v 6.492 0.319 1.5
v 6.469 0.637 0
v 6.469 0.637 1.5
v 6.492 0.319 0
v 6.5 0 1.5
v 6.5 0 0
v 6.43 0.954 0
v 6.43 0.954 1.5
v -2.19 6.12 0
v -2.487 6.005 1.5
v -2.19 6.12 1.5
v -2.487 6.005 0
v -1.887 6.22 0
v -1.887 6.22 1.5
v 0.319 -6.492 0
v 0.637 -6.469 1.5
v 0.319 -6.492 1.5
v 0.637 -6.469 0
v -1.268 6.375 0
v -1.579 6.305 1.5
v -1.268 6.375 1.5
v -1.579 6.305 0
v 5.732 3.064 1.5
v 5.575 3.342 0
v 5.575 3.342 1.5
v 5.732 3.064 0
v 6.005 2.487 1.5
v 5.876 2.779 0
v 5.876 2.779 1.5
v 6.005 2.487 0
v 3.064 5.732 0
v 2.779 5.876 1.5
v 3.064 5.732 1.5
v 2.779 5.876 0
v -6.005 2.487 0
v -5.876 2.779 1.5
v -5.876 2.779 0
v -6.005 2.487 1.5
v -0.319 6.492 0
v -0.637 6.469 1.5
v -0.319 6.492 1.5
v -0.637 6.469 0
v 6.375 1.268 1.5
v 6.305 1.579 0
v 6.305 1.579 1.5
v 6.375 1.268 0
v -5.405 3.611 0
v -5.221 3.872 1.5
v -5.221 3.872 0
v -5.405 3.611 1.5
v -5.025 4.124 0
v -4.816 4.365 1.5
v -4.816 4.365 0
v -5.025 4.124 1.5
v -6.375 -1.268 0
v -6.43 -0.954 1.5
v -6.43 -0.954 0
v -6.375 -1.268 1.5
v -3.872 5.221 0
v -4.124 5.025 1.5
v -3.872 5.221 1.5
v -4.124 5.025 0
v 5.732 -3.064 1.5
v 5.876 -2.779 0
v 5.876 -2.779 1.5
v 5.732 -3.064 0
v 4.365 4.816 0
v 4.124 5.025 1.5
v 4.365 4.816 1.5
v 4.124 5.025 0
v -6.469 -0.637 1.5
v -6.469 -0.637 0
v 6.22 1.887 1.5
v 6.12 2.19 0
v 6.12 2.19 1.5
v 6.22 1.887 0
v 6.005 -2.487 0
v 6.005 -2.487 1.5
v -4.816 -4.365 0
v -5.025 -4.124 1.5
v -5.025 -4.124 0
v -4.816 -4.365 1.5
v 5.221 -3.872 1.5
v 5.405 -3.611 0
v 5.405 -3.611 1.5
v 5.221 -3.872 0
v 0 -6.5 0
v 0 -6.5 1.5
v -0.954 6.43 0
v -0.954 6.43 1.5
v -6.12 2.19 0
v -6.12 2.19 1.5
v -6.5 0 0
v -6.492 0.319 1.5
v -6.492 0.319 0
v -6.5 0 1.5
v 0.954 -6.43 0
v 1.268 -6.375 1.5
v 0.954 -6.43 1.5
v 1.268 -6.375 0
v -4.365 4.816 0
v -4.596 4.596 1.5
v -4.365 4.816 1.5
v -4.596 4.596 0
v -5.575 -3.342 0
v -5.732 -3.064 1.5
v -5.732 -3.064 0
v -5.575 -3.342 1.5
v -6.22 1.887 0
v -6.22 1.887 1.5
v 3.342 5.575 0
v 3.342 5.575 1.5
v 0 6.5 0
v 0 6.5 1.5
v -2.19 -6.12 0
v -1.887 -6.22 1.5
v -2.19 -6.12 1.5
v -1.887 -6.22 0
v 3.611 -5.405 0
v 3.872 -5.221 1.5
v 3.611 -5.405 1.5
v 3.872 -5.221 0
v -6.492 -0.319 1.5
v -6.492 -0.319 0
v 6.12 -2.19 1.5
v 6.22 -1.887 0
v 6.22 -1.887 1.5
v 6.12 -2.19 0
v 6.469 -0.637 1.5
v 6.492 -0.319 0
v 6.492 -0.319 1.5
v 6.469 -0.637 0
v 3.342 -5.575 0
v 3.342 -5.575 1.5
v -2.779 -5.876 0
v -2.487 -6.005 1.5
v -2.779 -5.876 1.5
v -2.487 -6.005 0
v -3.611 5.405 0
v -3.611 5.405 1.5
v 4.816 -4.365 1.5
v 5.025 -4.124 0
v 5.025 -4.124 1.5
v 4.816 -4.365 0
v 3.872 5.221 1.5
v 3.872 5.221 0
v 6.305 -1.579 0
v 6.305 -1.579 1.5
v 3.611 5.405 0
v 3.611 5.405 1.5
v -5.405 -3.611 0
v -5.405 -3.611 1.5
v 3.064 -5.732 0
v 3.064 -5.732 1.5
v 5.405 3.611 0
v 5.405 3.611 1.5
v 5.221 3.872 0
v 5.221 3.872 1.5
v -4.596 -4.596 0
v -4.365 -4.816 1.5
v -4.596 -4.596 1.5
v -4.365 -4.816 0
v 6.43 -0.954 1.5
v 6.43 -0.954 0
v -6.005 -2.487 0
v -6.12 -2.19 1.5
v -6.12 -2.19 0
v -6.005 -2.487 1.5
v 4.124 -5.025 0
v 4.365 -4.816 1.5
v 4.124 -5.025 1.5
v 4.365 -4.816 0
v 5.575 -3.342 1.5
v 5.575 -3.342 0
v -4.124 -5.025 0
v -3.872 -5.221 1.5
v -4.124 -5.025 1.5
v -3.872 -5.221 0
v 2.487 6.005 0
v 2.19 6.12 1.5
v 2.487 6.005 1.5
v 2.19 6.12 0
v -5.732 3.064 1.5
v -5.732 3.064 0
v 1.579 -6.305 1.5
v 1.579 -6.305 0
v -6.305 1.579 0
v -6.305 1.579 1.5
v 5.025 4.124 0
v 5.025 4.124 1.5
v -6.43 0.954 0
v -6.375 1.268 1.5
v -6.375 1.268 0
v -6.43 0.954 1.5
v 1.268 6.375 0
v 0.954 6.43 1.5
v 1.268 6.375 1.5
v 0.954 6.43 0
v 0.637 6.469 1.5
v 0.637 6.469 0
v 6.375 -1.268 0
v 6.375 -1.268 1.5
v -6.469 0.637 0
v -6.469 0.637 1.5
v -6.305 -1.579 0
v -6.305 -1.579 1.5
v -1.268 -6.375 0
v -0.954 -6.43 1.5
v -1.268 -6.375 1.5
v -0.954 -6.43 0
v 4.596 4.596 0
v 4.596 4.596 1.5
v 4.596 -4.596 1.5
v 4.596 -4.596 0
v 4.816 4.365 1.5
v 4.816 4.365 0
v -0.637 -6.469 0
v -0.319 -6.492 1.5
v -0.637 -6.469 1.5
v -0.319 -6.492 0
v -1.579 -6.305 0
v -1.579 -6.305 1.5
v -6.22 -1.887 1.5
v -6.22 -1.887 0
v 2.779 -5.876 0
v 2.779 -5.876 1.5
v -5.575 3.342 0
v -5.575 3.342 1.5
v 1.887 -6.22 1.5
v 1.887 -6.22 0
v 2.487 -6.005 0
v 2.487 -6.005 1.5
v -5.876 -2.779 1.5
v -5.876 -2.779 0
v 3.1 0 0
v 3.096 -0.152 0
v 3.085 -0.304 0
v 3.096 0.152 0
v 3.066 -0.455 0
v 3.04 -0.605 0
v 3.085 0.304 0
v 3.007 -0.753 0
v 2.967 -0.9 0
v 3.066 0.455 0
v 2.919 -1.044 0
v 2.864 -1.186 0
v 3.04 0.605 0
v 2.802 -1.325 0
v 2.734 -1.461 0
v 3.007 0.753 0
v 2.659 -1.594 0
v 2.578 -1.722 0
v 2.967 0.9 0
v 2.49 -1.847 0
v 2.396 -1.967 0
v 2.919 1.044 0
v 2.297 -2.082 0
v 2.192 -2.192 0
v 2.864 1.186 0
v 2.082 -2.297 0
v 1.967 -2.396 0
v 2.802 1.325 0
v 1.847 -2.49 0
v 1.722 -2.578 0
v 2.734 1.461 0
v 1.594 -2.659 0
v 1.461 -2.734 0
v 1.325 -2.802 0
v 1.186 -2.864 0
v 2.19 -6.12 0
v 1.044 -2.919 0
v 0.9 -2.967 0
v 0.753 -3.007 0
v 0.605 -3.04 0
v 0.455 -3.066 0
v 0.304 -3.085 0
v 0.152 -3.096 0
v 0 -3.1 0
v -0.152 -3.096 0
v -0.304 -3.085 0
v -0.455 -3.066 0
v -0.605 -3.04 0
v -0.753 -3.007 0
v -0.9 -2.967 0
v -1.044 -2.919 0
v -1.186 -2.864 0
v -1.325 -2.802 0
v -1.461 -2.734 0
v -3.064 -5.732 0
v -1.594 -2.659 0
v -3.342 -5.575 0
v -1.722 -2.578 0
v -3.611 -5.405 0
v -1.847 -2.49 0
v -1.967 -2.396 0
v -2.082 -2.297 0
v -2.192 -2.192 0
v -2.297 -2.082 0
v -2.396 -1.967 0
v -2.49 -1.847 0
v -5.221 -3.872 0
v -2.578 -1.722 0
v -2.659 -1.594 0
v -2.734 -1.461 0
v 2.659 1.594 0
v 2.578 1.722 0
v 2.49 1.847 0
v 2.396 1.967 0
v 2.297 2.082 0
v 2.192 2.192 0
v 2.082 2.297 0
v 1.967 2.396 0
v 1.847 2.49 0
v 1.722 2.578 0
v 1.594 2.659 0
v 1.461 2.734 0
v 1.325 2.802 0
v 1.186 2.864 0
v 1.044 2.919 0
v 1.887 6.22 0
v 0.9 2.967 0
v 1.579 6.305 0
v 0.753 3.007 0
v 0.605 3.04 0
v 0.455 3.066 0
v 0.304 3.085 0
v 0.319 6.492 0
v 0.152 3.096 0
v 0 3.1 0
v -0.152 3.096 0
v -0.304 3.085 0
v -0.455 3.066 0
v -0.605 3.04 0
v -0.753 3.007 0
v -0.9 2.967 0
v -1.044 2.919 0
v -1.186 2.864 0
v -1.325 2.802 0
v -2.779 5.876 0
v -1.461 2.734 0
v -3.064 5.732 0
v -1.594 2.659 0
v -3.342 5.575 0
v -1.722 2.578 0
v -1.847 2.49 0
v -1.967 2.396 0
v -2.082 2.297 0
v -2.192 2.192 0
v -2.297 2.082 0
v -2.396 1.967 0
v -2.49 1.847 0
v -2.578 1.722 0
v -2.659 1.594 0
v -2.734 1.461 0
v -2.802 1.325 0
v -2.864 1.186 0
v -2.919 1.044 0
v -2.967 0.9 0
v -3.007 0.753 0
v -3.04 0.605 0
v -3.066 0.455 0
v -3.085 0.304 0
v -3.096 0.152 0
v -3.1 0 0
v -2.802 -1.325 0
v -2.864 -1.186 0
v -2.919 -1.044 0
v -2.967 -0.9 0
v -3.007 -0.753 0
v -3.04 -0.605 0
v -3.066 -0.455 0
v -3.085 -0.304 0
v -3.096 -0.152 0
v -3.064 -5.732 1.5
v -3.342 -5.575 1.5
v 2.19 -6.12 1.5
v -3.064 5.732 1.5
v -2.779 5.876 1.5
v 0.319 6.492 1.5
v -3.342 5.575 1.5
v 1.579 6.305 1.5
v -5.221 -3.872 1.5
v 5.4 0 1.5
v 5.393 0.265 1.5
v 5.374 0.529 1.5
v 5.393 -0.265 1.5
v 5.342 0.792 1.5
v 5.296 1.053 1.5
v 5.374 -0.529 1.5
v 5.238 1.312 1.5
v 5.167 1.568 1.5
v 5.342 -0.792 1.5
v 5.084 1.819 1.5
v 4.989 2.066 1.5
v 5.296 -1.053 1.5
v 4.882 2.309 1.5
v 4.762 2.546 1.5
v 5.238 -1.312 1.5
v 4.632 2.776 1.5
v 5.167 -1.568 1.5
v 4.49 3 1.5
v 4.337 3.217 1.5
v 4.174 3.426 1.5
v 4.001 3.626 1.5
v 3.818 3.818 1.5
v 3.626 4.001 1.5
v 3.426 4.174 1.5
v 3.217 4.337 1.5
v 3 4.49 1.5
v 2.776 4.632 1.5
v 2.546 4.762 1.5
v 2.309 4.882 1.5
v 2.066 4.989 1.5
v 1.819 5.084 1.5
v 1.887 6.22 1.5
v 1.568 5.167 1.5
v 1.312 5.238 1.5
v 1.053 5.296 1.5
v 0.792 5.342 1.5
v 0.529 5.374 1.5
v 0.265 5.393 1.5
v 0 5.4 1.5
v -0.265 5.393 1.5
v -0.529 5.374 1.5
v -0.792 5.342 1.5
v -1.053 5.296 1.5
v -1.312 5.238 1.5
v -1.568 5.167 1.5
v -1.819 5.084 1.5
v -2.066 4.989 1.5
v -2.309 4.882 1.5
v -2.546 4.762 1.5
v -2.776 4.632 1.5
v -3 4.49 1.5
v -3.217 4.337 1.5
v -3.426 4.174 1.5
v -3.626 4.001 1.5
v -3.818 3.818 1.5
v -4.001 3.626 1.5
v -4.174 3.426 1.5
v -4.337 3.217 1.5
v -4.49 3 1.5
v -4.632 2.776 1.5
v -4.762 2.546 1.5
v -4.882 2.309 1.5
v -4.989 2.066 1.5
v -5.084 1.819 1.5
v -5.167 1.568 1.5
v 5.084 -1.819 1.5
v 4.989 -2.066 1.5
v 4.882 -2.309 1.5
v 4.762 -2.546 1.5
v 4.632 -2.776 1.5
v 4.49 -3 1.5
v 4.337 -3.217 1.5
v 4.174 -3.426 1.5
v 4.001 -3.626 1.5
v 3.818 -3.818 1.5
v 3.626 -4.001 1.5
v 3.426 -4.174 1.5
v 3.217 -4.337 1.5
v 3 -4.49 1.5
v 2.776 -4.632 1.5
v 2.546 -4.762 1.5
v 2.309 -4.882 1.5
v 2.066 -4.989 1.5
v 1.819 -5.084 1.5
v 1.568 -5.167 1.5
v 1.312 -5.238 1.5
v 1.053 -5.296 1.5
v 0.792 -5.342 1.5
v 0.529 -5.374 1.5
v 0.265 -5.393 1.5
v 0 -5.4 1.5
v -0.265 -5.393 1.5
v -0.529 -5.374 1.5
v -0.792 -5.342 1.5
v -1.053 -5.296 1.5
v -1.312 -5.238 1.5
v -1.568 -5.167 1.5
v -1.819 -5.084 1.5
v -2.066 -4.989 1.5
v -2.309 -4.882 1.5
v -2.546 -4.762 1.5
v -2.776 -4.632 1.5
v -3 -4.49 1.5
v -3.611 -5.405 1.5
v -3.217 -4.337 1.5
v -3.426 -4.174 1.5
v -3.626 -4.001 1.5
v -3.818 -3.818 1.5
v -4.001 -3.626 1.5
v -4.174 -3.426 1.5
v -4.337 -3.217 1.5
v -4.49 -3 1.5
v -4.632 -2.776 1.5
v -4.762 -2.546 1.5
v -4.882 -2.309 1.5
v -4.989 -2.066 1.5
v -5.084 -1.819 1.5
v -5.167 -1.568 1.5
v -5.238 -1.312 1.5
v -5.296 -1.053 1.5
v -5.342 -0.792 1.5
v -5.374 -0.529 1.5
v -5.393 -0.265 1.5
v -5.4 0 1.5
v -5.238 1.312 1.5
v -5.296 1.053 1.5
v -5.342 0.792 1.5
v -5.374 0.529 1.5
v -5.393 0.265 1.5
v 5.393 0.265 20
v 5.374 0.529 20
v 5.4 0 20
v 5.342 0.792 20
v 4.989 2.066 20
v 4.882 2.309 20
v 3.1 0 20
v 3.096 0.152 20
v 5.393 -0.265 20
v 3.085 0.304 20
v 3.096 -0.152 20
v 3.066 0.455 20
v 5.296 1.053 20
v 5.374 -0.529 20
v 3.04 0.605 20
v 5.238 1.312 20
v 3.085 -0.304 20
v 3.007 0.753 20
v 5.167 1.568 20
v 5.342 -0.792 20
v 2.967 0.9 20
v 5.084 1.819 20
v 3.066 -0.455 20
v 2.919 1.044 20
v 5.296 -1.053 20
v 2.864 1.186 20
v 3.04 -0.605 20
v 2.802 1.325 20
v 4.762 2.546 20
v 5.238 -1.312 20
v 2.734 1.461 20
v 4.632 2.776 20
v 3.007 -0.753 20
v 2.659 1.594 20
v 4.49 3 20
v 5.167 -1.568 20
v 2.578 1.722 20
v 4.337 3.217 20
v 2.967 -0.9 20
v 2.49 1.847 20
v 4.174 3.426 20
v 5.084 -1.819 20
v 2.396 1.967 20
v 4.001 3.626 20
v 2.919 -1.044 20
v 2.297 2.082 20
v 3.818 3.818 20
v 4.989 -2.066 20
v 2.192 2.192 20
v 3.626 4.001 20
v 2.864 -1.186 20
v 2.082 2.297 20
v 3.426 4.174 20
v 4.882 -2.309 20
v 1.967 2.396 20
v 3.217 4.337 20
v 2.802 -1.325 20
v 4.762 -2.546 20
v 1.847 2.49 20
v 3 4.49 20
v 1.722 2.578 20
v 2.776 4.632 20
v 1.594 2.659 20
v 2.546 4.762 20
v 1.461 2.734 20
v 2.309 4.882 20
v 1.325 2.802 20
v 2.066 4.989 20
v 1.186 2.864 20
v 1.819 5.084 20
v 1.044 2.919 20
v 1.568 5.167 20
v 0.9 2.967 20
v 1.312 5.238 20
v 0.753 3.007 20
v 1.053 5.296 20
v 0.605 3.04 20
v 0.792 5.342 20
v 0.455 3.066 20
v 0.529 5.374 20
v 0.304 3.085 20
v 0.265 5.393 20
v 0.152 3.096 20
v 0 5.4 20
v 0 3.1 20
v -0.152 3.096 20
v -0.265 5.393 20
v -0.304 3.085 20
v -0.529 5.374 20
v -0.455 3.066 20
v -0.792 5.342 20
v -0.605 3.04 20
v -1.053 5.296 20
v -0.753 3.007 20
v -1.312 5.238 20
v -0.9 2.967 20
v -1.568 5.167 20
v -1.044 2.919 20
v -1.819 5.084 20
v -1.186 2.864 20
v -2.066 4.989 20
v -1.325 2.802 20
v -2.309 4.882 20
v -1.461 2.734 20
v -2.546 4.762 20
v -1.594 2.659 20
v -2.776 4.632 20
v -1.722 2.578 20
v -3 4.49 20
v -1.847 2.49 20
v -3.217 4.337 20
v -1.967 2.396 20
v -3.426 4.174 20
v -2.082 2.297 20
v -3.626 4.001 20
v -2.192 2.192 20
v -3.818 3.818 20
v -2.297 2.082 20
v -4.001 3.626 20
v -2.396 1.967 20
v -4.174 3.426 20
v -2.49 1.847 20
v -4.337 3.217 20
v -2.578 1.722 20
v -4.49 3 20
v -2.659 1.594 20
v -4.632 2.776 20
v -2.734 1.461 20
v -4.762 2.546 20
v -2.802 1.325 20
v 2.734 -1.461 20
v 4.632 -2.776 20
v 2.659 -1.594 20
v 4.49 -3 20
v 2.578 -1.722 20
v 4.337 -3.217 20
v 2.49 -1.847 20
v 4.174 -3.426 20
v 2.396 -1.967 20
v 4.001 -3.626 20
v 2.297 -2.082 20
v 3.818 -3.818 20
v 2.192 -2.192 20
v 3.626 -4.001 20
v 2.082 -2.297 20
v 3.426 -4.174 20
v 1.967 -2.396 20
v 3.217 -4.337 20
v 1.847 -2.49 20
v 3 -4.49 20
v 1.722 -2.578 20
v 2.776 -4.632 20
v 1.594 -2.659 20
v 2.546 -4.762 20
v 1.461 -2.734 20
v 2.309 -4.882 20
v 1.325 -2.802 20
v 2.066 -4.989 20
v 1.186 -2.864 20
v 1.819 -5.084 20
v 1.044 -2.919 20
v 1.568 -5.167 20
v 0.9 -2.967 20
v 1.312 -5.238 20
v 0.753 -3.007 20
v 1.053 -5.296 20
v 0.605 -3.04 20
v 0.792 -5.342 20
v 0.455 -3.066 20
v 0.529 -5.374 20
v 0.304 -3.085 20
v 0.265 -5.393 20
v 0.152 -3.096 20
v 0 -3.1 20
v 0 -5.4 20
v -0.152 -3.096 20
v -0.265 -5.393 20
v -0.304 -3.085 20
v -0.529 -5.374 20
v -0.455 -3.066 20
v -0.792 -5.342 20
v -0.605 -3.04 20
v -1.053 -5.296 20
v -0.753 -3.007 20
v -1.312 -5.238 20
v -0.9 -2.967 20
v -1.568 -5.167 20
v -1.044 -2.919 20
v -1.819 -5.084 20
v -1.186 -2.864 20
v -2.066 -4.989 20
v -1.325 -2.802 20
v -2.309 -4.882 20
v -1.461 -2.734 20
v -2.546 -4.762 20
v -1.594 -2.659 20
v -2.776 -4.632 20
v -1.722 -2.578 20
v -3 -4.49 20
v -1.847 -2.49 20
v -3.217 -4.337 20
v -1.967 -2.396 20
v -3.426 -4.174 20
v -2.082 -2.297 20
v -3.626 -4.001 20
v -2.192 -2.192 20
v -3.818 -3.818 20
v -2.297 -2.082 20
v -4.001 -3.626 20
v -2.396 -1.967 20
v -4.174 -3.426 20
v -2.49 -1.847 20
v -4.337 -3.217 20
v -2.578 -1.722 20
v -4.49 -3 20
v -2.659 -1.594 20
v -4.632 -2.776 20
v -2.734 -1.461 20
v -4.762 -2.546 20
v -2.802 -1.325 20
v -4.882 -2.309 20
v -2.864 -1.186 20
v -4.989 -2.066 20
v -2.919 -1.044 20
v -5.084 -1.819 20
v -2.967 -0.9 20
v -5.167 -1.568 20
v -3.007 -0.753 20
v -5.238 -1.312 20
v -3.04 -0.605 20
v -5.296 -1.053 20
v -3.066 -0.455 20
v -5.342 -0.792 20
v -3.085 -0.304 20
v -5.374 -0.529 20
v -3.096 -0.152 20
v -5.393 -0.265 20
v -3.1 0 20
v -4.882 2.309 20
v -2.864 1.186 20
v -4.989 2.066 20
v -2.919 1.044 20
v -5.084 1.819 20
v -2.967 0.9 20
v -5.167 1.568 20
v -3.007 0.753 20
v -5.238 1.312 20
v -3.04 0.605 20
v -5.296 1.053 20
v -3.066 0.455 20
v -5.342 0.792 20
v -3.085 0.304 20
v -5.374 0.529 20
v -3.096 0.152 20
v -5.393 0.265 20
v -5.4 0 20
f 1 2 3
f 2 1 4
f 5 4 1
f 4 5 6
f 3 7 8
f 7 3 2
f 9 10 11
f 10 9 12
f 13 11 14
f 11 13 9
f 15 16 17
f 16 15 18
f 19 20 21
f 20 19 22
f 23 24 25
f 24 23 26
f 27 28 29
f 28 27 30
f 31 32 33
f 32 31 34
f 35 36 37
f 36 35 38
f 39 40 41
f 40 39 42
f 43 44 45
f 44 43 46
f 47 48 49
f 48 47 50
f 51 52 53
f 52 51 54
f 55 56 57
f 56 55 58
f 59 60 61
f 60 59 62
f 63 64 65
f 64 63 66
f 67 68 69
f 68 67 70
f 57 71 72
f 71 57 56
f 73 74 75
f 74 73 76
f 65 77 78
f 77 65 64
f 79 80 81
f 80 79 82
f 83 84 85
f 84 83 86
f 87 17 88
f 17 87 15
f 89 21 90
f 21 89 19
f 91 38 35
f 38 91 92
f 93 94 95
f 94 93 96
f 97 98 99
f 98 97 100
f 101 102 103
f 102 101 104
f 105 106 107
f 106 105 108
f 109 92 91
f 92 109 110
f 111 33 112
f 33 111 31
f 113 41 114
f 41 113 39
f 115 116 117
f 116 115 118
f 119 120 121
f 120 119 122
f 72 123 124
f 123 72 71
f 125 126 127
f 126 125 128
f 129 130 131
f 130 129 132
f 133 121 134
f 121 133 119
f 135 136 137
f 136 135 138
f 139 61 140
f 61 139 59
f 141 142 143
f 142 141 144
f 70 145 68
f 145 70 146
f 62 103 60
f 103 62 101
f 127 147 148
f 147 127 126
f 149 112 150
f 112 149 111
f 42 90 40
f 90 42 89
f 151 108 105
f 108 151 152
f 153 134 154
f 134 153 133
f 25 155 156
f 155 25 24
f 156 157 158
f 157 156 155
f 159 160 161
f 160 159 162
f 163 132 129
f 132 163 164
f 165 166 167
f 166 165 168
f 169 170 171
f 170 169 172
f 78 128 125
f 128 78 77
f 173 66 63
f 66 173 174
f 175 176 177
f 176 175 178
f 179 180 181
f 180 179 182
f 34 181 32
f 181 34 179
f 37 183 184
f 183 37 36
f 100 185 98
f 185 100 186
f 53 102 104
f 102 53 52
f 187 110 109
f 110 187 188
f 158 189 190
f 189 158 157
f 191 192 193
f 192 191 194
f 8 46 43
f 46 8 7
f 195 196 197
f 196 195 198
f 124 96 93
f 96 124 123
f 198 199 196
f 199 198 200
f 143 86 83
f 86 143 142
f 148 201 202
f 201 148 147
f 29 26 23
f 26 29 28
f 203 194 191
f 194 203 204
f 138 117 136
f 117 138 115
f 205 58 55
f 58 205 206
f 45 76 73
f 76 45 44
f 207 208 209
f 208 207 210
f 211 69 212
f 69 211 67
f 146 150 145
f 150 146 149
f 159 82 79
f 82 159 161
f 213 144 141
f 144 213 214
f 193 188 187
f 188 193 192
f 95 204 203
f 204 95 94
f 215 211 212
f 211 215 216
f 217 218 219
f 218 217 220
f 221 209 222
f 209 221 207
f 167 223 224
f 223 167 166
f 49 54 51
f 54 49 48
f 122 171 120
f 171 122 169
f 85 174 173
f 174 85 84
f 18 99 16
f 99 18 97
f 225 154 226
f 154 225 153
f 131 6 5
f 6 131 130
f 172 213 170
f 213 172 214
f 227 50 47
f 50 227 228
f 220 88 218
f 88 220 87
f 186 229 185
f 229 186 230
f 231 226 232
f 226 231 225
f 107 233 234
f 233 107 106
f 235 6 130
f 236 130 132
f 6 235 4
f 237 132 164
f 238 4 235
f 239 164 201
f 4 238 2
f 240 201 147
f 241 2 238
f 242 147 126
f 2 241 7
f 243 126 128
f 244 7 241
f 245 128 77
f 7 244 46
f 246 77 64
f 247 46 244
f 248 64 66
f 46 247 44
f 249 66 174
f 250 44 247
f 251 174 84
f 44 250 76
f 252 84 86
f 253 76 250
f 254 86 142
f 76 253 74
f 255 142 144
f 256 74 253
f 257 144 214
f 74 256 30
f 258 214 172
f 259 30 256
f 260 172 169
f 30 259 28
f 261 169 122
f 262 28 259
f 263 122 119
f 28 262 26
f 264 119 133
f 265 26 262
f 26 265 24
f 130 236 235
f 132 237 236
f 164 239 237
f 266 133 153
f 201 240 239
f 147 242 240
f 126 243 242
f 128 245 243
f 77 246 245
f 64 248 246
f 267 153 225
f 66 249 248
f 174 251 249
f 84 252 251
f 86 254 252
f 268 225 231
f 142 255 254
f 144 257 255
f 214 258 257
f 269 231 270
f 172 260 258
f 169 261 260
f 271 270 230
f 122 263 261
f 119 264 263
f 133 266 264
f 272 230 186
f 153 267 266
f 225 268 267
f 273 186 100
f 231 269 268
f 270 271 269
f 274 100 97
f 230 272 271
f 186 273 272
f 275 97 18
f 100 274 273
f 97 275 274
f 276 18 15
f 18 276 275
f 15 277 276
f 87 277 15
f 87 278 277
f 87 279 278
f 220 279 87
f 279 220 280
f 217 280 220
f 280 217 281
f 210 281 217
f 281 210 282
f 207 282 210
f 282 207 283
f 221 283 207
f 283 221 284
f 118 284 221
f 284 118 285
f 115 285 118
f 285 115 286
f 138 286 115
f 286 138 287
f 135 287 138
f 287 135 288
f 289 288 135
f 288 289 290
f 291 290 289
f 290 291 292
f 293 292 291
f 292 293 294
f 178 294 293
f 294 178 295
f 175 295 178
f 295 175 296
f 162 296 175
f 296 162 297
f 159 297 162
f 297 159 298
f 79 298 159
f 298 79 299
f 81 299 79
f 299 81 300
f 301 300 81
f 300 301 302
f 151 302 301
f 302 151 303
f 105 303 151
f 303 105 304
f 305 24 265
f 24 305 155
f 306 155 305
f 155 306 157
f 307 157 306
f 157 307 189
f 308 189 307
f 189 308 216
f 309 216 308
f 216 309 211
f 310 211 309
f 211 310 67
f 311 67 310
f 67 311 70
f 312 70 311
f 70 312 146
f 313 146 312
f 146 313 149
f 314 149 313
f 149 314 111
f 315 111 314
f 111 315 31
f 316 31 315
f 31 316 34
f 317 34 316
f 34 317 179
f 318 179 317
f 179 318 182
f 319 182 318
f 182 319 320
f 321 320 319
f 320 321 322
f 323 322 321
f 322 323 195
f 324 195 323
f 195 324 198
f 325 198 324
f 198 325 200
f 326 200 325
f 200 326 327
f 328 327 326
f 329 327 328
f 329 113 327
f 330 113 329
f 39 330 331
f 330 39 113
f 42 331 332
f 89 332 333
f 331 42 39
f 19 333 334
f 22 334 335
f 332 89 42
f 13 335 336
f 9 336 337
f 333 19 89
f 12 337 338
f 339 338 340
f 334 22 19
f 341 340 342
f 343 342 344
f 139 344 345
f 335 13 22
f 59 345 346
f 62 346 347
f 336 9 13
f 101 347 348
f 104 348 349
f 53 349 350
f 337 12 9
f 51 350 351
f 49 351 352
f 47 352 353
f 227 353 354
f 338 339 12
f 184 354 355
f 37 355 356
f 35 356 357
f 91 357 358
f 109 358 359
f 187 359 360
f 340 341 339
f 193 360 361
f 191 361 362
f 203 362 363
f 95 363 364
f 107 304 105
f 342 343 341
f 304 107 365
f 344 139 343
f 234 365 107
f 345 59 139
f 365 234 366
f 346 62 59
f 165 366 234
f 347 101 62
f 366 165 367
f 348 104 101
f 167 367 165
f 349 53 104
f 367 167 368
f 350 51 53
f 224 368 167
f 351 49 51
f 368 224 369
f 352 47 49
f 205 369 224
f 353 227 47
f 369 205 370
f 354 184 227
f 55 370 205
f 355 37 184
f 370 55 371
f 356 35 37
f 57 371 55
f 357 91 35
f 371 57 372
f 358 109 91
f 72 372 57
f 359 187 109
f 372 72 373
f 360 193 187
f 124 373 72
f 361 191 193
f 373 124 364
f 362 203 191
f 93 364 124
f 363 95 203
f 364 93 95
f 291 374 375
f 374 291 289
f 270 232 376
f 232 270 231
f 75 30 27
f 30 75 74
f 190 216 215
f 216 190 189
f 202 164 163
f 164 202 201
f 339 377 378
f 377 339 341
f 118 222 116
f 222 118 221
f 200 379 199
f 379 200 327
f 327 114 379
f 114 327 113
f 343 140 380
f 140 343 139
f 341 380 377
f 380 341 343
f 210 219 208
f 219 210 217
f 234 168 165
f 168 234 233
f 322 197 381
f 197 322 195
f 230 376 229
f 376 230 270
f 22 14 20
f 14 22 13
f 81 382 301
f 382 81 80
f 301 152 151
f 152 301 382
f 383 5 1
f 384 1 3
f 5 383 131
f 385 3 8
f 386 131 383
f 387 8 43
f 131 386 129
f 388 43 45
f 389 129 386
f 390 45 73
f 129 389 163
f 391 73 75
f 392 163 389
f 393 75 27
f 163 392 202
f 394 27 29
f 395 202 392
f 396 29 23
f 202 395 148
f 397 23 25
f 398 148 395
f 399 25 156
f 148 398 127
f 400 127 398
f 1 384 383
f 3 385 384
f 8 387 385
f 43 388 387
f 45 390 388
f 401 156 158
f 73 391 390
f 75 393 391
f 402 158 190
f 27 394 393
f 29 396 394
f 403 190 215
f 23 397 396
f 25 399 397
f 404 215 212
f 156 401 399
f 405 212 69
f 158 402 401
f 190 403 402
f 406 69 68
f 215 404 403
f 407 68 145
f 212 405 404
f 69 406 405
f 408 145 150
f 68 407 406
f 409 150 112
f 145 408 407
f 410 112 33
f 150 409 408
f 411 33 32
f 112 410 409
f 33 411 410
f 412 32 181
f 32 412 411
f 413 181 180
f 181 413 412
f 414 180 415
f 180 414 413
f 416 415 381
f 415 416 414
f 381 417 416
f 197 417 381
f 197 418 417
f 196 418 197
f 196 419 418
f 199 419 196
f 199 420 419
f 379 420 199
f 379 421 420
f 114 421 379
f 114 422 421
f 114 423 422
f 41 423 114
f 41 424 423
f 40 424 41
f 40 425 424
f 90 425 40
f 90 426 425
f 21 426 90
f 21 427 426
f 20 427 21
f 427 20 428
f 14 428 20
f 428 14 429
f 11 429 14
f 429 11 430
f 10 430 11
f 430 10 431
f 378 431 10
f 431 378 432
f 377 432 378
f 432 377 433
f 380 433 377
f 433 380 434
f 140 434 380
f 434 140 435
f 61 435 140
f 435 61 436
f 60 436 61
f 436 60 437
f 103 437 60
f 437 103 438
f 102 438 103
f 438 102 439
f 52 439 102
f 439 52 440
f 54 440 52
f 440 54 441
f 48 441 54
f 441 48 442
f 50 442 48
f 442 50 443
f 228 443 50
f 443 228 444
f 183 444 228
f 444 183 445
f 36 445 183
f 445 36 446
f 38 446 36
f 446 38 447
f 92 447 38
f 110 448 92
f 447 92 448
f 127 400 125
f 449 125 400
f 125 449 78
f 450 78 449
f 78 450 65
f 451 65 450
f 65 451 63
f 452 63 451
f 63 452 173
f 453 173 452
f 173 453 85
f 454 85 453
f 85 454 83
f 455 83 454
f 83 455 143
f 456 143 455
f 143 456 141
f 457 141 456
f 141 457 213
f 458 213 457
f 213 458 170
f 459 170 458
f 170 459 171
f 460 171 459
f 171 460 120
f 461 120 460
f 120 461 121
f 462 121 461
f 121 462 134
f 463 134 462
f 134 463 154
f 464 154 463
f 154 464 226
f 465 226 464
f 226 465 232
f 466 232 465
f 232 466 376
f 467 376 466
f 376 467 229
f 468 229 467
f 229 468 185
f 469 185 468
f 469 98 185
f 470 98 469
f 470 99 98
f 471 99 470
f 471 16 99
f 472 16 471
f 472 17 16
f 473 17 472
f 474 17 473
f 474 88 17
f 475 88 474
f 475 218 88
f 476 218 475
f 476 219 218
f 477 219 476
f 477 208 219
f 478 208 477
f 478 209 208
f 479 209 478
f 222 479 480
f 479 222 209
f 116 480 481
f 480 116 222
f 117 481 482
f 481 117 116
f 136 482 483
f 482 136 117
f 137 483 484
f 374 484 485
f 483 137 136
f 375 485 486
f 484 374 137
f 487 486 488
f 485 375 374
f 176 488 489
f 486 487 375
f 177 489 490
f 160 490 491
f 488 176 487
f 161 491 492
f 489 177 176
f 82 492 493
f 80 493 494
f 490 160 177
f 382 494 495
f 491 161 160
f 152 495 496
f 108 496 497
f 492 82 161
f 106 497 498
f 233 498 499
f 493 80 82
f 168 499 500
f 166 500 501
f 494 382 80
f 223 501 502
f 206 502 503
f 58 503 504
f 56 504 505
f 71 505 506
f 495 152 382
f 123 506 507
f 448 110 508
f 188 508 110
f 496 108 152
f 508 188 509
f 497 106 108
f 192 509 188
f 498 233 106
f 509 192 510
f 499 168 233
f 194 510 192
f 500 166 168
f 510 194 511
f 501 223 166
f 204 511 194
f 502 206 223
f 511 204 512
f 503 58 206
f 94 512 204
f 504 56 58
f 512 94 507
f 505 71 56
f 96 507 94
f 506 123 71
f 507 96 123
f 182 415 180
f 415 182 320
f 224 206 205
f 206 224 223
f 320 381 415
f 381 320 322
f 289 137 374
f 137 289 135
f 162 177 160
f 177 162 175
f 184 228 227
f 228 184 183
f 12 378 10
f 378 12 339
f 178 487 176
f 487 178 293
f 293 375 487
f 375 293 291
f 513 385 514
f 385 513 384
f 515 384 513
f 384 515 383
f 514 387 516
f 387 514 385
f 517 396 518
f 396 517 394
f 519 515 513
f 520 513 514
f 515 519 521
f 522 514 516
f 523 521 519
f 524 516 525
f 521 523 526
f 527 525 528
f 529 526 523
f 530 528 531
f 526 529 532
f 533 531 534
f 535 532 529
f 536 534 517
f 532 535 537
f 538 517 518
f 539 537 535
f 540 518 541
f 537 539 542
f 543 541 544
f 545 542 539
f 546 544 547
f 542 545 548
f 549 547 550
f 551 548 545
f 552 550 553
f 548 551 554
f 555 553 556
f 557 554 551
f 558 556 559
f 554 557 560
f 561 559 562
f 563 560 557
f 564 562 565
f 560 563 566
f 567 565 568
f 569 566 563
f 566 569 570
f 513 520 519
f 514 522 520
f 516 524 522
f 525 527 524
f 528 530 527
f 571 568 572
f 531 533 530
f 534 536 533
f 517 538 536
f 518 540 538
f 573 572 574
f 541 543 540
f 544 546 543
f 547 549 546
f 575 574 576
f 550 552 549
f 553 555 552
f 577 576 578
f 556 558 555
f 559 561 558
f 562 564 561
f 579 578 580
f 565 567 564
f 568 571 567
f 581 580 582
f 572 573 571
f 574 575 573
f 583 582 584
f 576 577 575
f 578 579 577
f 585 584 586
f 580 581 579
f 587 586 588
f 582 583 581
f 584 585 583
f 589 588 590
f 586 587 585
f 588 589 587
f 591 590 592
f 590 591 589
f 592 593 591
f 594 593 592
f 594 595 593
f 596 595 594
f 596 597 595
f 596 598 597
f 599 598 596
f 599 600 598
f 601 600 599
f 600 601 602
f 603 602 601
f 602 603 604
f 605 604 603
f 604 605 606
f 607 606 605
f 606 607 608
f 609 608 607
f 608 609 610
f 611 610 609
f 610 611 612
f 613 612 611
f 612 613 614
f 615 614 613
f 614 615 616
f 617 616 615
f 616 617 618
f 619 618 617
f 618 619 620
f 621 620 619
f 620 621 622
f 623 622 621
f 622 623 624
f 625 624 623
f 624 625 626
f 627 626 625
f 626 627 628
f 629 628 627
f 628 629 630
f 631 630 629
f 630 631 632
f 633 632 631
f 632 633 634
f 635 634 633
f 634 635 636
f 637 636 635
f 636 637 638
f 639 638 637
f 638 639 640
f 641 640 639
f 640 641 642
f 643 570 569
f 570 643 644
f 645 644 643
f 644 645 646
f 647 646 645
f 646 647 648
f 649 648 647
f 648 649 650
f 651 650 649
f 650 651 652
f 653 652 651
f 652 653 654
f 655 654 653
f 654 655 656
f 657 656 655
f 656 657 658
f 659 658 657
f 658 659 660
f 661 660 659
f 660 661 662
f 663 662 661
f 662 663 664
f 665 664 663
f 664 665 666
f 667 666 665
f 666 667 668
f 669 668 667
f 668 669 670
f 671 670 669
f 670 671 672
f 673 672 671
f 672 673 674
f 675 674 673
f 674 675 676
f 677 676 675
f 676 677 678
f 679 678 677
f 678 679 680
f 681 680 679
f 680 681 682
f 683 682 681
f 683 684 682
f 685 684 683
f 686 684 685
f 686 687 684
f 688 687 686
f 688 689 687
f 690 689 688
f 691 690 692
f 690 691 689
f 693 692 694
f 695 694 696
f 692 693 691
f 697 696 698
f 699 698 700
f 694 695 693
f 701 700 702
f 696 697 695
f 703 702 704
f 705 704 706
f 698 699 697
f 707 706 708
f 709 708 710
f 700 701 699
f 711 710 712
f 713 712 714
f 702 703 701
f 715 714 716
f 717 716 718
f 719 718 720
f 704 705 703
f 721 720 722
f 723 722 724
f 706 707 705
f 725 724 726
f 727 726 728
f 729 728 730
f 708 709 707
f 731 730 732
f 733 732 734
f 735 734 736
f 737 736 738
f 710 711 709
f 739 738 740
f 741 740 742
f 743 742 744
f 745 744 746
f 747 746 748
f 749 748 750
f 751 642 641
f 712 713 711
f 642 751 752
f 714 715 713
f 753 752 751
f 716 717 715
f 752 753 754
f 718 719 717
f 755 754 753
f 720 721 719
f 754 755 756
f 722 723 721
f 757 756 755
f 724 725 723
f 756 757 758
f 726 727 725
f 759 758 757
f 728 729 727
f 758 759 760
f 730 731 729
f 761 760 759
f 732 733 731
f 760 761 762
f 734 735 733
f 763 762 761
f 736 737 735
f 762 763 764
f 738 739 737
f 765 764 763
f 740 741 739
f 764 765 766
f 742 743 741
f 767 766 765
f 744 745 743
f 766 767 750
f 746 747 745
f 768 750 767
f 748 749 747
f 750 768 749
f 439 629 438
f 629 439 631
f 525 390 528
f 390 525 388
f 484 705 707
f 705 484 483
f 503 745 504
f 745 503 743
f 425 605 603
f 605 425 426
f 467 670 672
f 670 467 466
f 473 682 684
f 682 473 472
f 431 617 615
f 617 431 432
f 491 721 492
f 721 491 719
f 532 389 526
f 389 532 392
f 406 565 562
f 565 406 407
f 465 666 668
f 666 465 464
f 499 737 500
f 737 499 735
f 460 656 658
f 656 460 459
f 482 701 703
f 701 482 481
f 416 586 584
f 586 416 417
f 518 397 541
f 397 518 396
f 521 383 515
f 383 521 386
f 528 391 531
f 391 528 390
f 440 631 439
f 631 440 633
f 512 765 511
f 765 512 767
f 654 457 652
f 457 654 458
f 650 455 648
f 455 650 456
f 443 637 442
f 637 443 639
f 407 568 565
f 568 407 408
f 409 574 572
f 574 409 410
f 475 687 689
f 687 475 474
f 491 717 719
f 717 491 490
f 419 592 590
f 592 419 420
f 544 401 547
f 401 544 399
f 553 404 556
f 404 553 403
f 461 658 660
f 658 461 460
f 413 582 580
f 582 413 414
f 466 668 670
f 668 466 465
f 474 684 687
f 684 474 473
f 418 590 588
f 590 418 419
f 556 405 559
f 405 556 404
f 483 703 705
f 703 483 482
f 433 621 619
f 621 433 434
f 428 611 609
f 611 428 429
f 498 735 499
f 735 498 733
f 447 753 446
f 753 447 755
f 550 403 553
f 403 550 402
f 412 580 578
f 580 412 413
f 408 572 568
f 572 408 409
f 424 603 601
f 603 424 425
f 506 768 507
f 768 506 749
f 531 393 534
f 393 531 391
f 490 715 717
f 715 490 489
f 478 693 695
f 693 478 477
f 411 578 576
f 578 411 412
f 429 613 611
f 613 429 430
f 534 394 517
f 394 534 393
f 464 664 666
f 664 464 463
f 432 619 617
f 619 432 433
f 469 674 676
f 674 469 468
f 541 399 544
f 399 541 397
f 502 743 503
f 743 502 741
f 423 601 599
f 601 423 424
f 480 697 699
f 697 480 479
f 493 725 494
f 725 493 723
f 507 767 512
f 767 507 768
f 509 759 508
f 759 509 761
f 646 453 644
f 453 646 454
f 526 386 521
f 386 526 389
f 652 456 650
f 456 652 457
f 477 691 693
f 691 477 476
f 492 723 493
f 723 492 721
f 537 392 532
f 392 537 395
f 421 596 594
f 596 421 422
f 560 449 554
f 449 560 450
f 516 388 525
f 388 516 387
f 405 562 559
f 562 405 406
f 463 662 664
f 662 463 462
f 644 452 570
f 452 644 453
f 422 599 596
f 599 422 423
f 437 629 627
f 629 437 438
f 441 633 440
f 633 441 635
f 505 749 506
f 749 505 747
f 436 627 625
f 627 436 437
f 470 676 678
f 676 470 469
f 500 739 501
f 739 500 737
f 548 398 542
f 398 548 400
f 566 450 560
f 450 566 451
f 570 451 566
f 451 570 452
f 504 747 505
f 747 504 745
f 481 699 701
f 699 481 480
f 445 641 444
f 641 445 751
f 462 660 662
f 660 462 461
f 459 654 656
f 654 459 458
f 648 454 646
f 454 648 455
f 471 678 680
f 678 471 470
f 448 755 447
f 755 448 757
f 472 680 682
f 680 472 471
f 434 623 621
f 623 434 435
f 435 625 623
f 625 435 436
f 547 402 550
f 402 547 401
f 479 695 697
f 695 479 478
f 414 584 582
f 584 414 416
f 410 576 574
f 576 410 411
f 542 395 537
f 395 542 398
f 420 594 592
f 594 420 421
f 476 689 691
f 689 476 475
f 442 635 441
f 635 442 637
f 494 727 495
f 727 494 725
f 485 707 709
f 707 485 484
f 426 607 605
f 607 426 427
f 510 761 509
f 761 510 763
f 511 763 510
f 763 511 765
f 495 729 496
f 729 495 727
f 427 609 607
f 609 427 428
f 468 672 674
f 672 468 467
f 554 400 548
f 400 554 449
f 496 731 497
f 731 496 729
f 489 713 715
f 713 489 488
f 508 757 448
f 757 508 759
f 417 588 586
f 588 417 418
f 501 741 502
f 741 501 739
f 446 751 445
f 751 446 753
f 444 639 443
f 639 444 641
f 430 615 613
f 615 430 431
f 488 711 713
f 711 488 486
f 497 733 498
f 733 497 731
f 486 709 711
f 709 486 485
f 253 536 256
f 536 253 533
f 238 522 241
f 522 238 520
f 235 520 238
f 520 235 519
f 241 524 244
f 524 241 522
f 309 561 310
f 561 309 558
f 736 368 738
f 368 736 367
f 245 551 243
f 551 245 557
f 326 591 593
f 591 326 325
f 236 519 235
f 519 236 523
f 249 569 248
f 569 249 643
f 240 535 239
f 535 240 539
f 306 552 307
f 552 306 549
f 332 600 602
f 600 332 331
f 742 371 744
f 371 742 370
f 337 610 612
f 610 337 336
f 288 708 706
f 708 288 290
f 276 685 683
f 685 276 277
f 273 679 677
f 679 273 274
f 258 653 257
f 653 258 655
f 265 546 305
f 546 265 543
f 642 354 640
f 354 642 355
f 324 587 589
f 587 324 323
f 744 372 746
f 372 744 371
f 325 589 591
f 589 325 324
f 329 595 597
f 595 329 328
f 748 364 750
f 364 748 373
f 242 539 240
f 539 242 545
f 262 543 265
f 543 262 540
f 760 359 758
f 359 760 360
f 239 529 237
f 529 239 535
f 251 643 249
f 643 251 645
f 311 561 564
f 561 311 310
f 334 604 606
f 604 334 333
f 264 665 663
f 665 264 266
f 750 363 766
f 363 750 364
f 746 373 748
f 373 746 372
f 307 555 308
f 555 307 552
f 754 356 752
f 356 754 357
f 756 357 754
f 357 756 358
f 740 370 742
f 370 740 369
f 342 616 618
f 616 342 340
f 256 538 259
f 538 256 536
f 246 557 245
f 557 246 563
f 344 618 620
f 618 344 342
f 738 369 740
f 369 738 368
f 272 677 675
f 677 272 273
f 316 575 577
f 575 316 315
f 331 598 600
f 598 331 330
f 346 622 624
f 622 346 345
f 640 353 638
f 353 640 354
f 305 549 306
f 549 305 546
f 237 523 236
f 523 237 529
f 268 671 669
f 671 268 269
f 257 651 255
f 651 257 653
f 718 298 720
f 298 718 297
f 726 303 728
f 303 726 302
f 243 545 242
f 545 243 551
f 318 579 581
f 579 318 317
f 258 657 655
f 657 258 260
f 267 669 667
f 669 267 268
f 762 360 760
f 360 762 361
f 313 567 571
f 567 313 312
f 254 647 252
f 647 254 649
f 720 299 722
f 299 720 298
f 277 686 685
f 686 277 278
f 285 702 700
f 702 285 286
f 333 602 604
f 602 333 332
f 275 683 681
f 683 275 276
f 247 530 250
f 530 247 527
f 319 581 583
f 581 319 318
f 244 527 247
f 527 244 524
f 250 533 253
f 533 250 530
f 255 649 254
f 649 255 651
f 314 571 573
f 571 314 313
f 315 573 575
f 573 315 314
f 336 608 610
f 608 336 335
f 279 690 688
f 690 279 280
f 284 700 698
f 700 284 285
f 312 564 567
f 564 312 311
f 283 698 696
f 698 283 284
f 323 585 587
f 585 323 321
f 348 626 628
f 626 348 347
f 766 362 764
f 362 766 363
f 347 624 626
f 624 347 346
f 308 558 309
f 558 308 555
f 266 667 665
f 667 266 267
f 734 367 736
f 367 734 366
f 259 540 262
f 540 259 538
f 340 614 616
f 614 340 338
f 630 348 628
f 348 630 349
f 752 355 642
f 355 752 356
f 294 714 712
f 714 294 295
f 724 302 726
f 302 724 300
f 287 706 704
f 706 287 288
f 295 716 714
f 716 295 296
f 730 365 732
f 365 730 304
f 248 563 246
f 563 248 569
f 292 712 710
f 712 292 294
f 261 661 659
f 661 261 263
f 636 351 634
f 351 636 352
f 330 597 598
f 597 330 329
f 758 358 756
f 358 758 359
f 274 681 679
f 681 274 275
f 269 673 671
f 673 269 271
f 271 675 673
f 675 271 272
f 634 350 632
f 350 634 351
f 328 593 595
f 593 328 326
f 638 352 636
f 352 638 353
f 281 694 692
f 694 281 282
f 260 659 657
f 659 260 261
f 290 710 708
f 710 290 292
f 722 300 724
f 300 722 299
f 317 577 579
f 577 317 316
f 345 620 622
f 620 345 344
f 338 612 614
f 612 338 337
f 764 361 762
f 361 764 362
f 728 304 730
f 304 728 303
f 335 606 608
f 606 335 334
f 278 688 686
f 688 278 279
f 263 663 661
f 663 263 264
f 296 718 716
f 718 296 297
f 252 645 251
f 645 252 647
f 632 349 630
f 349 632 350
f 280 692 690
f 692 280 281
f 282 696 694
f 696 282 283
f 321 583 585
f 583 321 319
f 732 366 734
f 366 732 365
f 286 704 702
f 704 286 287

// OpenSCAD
$fn = 128; // High resolution for smooth cylindrical surfaces

// --- Dimensions (mm) ---
// Base Collar
$collar_diameter = 13.0;
$collar_thickness = 1.5;

// Sleeve Body
$sleeve_outer_diameter = 10.8;
$sleeve_total_height = 21.5;

// Bore
$bore_diameter = 6.2;

// --- Calculation ---
// Calculate radii for clarity
$r_collar = $collar_diameter / 2;
$r_sleeve_outer = $sleeve_outer_diameter / 2;
$r_bore = $bore_diameter / 2;

// --- Build ---
module adapter_sleeve() {
    difference() {
        // 1. Create the solid outer shape (Collar + Sleeve Body)
        union() {
            // Collar (Lies on bed, z=0 to z=1.5)
            cylinder(
                h = $collar_thickness,
                r = $r_collar,
                center = [0, 0, $collar_thickness / 2]
            );
            
            // Sleeve Body (Rises from top of collar to z=21.5)
            // Height of body = Total Height - Collar Thickness
            $body_height = $sleeve_total_height - $collar_thickness;
            cylinder(
                h = $body_height,
                r = $r_sleeve_outer,
                center = [0, 0, $collar_thickness + $body_height / 2]
            );
        }
        
        // 2. Cut the bore through the full height
        // The bore runs from z=0 to z=$sleeve_total_height
        cylinder(
            h = $sleeve_total_height,
            r = $r_bore,
            center = [0, 0, $sleeve_total_height / 2]
        );
    }
}

// Center the part on the origin as requested
translate([0, 0, 0]) {
    adapter_sleeve();
}
